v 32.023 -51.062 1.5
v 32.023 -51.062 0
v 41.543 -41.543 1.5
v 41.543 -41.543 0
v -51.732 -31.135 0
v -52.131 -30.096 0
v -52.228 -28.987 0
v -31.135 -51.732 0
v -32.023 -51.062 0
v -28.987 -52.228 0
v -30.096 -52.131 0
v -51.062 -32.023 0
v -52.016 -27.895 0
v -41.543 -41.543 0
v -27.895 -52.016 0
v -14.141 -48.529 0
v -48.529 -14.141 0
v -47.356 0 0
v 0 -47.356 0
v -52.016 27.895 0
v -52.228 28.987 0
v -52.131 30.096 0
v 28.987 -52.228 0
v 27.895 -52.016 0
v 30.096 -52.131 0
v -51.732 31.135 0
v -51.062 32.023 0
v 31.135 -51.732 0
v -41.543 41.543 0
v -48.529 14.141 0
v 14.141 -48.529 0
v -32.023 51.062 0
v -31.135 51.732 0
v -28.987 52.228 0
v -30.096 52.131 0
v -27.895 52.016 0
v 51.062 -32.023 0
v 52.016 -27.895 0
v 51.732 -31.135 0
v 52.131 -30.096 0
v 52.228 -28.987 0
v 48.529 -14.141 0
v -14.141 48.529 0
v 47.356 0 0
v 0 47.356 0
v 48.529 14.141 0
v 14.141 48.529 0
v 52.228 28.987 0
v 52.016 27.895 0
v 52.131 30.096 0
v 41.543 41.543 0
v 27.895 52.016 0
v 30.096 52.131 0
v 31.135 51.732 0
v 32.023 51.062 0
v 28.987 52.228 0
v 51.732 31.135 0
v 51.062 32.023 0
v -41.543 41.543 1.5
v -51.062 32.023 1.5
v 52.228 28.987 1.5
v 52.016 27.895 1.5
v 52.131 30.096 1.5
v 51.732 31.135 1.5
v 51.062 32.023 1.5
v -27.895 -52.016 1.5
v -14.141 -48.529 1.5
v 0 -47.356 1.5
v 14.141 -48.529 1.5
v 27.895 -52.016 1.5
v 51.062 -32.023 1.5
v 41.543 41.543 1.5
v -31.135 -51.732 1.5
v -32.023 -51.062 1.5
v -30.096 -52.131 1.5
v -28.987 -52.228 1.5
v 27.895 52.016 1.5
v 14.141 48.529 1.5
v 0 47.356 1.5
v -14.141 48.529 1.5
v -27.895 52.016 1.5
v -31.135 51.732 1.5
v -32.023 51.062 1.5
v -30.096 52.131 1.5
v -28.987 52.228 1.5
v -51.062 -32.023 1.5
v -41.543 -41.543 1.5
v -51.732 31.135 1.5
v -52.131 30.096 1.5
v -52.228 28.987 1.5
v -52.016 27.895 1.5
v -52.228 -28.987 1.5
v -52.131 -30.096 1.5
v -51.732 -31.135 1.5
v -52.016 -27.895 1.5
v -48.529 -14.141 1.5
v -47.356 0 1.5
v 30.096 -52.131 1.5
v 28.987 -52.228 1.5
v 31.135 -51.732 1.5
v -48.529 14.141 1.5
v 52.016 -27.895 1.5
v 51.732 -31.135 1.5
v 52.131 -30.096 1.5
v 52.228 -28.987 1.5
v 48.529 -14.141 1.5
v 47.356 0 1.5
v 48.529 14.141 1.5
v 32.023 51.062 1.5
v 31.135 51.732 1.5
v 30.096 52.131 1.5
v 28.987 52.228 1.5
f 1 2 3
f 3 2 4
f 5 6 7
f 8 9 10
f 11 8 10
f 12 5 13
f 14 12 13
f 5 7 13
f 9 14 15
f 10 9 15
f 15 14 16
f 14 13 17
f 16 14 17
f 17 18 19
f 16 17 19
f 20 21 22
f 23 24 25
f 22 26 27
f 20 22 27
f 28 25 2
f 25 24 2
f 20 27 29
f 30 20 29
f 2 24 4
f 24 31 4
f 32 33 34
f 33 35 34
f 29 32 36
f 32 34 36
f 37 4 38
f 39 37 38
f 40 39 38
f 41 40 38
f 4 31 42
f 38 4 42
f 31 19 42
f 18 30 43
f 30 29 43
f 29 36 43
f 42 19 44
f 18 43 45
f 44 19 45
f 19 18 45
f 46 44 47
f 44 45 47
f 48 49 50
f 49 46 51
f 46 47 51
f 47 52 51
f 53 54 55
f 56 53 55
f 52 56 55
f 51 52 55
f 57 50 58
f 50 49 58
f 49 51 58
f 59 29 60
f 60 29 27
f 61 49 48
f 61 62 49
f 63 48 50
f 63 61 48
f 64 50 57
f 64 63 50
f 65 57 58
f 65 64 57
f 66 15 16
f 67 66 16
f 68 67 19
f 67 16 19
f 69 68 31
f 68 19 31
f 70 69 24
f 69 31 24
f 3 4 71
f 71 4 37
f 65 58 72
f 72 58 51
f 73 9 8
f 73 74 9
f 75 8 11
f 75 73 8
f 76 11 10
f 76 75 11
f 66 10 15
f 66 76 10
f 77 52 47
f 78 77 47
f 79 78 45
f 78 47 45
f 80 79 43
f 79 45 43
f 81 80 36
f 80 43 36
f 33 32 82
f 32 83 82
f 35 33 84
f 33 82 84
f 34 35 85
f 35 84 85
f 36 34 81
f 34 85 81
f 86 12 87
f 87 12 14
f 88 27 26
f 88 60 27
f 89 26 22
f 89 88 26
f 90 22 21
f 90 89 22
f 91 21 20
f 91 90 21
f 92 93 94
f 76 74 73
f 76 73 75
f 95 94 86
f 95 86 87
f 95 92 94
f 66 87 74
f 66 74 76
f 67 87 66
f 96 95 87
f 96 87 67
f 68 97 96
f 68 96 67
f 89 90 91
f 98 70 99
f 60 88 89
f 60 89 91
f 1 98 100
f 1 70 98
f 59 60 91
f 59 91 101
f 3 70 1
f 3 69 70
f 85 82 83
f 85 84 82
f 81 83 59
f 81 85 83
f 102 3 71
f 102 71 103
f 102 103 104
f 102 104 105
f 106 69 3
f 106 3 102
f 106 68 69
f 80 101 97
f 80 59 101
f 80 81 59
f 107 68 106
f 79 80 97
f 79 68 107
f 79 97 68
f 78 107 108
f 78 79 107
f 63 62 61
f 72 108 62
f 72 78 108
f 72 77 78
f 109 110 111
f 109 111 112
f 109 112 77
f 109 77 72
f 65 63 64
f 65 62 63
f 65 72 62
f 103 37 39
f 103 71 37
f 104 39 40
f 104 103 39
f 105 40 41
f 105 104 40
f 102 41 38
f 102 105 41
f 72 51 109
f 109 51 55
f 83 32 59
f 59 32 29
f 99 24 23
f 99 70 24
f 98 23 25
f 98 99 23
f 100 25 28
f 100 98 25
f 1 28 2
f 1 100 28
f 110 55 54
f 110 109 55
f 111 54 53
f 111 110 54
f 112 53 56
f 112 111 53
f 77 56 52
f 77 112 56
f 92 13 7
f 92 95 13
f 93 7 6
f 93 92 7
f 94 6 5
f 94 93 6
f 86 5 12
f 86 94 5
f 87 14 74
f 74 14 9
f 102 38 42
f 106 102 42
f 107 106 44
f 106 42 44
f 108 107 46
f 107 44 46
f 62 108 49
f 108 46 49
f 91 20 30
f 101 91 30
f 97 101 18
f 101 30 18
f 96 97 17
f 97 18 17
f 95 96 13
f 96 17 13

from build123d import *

# Parameters (mm, degrees)
F2_DEPTH = 1.5
F3_R     = 4


with BuildPart() as f2:
    # F1 (on Top) → F2 (new body)
    with BuildSketch(Plane.XY):
        with BuildLine():
            Line((-30.228815, 52.856232), (-41.542523, 41.542523))
            Line((-41.542523, 41.542523), (-52.856232, 30.228815))
            ThreePointArc((-52.856232, 30.228815), (-47.356232, 0), (-52.856232, -30.228815))
            Line((-52.856232, -30.228815), (-41.542523, -41.542523))
            Line((-41.542523, -41.542523), (-30.228815, -52.856232))
            ThreePointArc((-30.228815, -52.856232), (0, -47.356232), (30.228815, -52.856232))
            Line((30.228815, -52.856232), (41.542523, -41.542523))
            Line((41.542523, -41.542523), (52.856232, -30.228815))
            ThreePointArc((52.856232, -30.228815), (47.356232, 0), (52.856232, 30.228815))
            Line((52.856232, 30.228815), (41.542523, 41.542523))
            Line((41.542523, 41.542523), (30.228815, 52.856232))
            ThreePointArc((30.228815, 52.856232), (0, 47.356232), (-30.228815, 52.856232))
        make_face()
    extrude(amount=F2_DEPTH)

    # F3
    f3_edges = [f2.edges().sort_by_distance(p)[0] for p in [
        (-52.856232, 30.228815, 0.75),
        (-30.228815, 52.856232, 0.75),
        (30.228815, 52.856232, 0.75),
        (52.856232, 30.228815, 0.75),
        (52.856232, -30.228815, 0.75),
        (30.228815, -52.856232, 0.75),
        (-30.228815, -52.856232, 0.75),
        (-52.856232, -30.228815, 0.75),
    ]]
    fillet(f3_edges, radius=F3_R)


solid = f2.part
